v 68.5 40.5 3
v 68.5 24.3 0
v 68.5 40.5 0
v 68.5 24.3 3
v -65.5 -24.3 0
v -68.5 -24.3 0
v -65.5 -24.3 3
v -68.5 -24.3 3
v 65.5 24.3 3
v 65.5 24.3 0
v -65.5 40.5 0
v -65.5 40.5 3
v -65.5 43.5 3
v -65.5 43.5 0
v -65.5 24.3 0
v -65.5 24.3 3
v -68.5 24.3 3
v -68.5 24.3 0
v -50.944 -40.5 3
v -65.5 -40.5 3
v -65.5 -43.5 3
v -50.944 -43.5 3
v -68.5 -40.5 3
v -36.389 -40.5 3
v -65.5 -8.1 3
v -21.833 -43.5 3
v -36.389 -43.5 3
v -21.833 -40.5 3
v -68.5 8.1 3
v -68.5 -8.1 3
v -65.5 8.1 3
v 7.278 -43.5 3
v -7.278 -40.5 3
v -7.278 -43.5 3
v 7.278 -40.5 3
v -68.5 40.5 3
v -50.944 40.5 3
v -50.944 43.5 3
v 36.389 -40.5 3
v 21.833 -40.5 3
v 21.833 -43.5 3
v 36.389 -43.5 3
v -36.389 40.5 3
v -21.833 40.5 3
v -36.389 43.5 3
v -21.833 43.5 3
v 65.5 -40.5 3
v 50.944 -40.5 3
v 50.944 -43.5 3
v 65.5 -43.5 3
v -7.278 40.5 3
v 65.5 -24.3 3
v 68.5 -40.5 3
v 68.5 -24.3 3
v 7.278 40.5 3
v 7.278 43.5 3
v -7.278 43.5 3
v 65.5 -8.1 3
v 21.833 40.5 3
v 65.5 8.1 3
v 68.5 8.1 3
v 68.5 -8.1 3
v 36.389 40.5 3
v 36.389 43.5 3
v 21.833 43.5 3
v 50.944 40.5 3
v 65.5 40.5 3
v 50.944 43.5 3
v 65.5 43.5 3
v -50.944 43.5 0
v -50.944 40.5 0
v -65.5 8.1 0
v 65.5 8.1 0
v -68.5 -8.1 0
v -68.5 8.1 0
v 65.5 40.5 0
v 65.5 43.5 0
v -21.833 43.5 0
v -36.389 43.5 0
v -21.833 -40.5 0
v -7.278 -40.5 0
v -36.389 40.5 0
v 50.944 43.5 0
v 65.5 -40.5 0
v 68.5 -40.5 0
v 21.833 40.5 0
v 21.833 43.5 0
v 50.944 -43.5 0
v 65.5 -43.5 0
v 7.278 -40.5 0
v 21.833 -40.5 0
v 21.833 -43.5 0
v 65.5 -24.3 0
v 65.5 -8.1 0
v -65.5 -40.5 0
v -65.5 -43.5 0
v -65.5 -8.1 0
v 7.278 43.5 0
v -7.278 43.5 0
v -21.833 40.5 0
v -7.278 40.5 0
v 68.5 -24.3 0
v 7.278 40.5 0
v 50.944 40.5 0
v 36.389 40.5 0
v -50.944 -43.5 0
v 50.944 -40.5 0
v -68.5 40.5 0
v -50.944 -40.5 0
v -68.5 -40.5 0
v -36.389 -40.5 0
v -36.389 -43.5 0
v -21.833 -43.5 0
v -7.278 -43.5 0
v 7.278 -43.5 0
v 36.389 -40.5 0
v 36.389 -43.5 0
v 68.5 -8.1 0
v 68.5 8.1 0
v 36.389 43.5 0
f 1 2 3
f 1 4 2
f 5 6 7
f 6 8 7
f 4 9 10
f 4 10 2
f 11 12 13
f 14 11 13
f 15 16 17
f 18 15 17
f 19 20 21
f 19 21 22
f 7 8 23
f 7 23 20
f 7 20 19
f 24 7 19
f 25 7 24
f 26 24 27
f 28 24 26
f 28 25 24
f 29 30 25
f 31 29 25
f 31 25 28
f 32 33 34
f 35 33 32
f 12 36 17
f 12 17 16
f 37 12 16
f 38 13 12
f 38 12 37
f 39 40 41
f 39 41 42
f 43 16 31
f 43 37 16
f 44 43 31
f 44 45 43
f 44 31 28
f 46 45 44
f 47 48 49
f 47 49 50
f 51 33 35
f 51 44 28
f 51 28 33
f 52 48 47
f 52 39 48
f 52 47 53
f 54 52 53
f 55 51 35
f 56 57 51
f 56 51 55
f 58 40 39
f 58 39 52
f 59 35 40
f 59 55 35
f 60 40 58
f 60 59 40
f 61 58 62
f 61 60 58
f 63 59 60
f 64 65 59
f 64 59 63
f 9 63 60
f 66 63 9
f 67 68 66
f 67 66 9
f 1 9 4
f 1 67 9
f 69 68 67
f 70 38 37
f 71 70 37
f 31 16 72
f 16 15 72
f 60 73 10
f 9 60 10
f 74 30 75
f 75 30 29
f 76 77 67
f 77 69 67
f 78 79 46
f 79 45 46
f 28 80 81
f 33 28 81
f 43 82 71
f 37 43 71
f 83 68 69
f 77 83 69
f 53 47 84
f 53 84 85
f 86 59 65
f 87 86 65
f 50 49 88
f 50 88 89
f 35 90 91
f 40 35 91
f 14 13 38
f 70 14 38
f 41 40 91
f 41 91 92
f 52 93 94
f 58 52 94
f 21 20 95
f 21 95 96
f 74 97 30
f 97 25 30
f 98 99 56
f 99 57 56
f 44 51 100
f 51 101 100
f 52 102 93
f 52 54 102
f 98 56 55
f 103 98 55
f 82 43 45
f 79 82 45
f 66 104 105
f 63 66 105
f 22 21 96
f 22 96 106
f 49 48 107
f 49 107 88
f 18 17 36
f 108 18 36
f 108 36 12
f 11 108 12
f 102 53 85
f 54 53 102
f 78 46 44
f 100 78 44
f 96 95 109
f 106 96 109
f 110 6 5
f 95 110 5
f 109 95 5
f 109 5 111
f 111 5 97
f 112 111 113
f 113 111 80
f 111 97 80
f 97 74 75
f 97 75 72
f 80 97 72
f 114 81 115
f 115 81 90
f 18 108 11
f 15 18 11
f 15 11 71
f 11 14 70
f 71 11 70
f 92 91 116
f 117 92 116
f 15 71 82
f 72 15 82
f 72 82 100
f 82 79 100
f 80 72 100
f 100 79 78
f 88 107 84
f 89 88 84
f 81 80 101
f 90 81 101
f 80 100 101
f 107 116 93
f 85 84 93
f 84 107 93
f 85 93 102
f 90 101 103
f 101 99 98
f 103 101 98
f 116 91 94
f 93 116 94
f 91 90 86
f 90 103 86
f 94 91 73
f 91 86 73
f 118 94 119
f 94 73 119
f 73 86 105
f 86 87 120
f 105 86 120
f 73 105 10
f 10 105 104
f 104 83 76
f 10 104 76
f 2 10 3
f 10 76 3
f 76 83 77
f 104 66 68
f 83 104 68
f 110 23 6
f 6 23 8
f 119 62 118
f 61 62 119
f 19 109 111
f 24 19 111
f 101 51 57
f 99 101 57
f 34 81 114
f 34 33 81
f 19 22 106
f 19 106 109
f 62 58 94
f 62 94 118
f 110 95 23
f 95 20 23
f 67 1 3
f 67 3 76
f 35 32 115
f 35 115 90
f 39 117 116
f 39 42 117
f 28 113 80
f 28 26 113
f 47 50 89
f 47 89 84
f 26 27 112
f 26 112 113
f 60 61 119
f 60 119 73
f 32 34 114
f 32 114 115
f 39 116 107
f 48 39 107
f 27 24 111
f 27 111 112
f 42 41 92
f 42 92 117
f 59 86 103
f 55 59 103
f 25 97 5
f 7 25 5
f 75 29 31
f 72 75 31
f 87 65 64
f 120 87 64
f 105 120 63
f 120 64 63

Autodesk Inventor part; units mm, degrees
ref_plane "YZ Plane" through (0, 0, 0) normal (1, 0, 0) x (0, 1, 0)
ref_plane "XZ Plane" through (0, 0, 0) normal (0, 1, 0) x (-1, 0, 0)
ref_plane "XY Plane" through (0, 0, 0) normal (0, 0, 1) x (1, 0, 0)
sketch "Sketch1" plane through (0, 0, 0) normal (0, 0, 1) x (1, 0, 0)
  line L0 (-65.5, -40.5) -> (65.5, -40.5)
  line L1 (65.5, -40.5) -> (65.5, 40.5)
  line L2 (65.5, 40.5) -> (-65.5, 40.5)
  line L3 (-65.5, 40.5) -> (-65.5, -40.5)
  line L4 (-65.5, -40.5) -> (65.5, 40.5) construction
  line L5 (65.5, -40.5) -> (-65.5, 40.5) construction
  point P0 (0, 0)
  dimension "d0" = 131
  dimension "d1" = 81
extrude "Extrusion1" add sketch "Sketch1" along normal blind 3
sketch "Sketch2" plane through (0, 0, 3) normal (0, 0, 1) x (1, 0, 0)
  line L0 (65.5, -40.5) -> (65.5, 40.5) projected
  line L1 (65.5, 40.5) -> (65.5, 24.3)
  line L2 (65.5, 24.3) -> (68.5, 24.3)
  line L3 (68.5, 24.3) -> (68.5, 40.5)
  line L4 (68.5, 40.5) -> (65.5, 40.5)
  line L5 (65.5, 8.1) -> (65.5, -8.1)
  line L6 (65.5, -8.1) -> (68.5, -8.1)
  line L7 (68.5, -8.1) -> (68.5, 8.1)
  line L8 (68.5, 8.1) -> (65.5, 8.1)
  line L9 (65.5, -24.3) -> (65.5, -40.5)
  line L10 (65.5, -40.5) -> (68.5, -40.5)
  line L11 (68.5, -40.5) -> (68.5, -24.3)
  line L12 (68.5, -24.3) -> (65.5, -24.3)
  line L13 (0, -60.9) -> (0, 60.9) projected
  line L14 (-91.7, 0) -> (91.7, 0) projected
  line L15 (-65.5, -40.5) -> (-65.5, 40.5)
  line L16 (-65.5, 40.5) -> (-65.5, 24.3)
  line L17 (-65.5, 24.3) -> (-68.5, 24.3)
  line L18 (-68.5, 24.3) -> (-68.5, 40.5)
  line L19 (-68.5, 40.5) -> (-65.5, 40.5)
  line L20 (-65.5, 8.1) -> (-65.5, -8.1)
  line L21 (-65.5, -8.1) -> (-68.5, -8.1)
  line L22 (-68.5, -8.1) -> (-68.5, 8.1)
  line L23 (-68.5, 8.1) -> (-65.5, 8.1)
  line L24 (-65.5, -24.3) -> (-65.5, -40.5)
  line L25 (-65.5, -40.5) -> (-68.5, -40.5)
  line L26 (-68.5, -40.5) -> (-68.5, -24.3)
  line L27 (-68.5, -24.3) -> (-65.5, -24.3)
  line L28 (65.5, 40.5) -> (-65.5, 40.5) projected
  line L29 (65.5, 40.5) -> (50.9444, 40.5)
  line L30 (50.9444, 40.5) -> (50.9444, 43.5)
  line L31 (50.9444, 43.5) -> (65.5, 43.5)
  line L32 (65.5, 43.5) -> (65.5, 40.5)
  line L33 (36.3889, 40.5) -> (21.8333, 40.5)
  line L34 (21.8333, 40.5) -> (21.8333, 43.5)
  line L35 (21.8333, 43.5) -> (36.3889, 43.5)
  line L36 (36.3889, 43.5) -> (36.3889, 40.5)
  line L37 (7.2778, 40.5) -> (-7.2778, 40.5)
  line L38 (-7.2778, 40.5) -> (-7.2778, 43.5)
  line L39 (-7.2778, 43.5) -> (7.2778, 43.5)
  line L40 (7.2778, 43.5) -> (7.2778, 40.5)
  line L41 (-21.8333, 40.5) -> (-36.3889, 40.5)
  line L42 (-36.3889, 40.5) -> (-36.3889, 43.5)
  line L43 (-36.3889, 43.5) -> (-21.8333, 43.5)
  line L44 (-21.8333, 43.5) -> (-21.8333, 40.5)
  line L45 (-50.9444, 40.5) -> (-65.5, 40.5)
  line L46 (-65.5, 40.5) -> (-65.5, 43.5)
  line L47 (-65.5, 43.5) -> (-50.9444, 43.5)
  line L48 (-50.9444, 43.5) -> (-50.9444, 40.5)
  line L49 (-68.5, -40.5) -> (-65.5, -40.5)
  line L50 (65.5, -40.5) -> (-65.5, -40.5)
  line L51 (65.5, -40.5) -> (50.9444, -40.5)
  line L52 (50.9444, -40.5) -> (50.9444, -43.5)
  line L53 (50.9444, -43.5) -> (65.5, -43.5)
  line L54 (65.5, -43.5) -> (65.5, -40.5)
  line L55 (36.3889, -40.5) -> (21.8333, -40.5)
  line L56 (36.3889, -43.5) -> (36.3889, -40.5)
  line L57 (21.8333, -43.5) -> (36.3889, -43.5)
  line L58 (21.8333, -40.5) -> (21.8333, -43.5)
  line L59 (7.2778, -40.5) -> (-7.2778, -40.5)
  line L60 (7.2778, -43.5) -> (7.2778, -40.5)
  line L61 (-7.2778, -43.5) -> (7.2778, -43.5)
  line L62 (-7.2778, -40.5) -> (-7.2778, -43.5)
  line L63 (-21.8333, -40.5) -> (-36.3889, -40.5)
  line L64 (-21.8333, -43.5) -> (-21.8333, -40.5)
  line L65 (-36.3889, -43.5) -> (-21.8333, -43.5)
  line L66 (-36.3889, -40.5) -> (-36.3889, -43.5)
  line L67 (-50.9444, -40.5) -> (-65.5, -40.5)
  line L68 (-50.9444, -43.5) -> (-50.9444, -40.5)
  line L69 (-65.5, -43.5) -> (-50.9444, -43.5)
  line L70 (-65.5, -40.5) -> (-65.5, -43.5)
  point P0 (0, 0)
  point P1 (65.5, 0)
  point P2 (65.5, -32.4)
  point P3 (65.5, 0)
  point P4 (-65.5, 0)
  point P5 (-65.5, -32.4)
  point P6 (-65.5, 0)
  point P7 (0, 43.5)
  point P8 (0, 40.5)
  point P9 (0, -43.5)
  point P10 (0, -40.5)
  point P11 (-21.8333, -40.5)
  point P12 (7.2778, -40.5)
  point P13 (-7.2778, -40.5)
  point P14 (-7.2778, 40.5)
  point P15 (7.2778, 40.5)
  point P16 (-65.5, 8.1)
  point P17 (-21.8333, 40.5)
  dimension "d4" = 3
  dimension "d5" = 16.2
  dimension "d6" = 3
  dimension "d7" = 16.2
  dimension "d10" = 3
  dimension "d11" = 16.2
  dimension "d14" = 3
  dimension "d15" = 14.5556
  dimension "d16" = 3
  dimension "d17" = 14.5556
  dimension "d21" = 3
  dimension "d22" = 14.5556
  dimension "d26" = 3
  dimension "d27" = 14.5556
  dimension "d31" = 3
  dimension "d32" = 14.5556
  dimension "d36" = 14.5556
  dimension "d37" = 14.5556
extrude "Extrusion2" add sketch "Sketch2" against normal up to surface (3 mm away) contours L0 L12 L11 L10 | L54 L53 L52 L50 | L0 L14 L7 L6 | L56 L57 L58 L50 | L0 L8 L7 L14 | L60 L61 L13 L50 | L0 L4 L3 L2 | L13 L61 L62 L50 | L28 L38 L39 L13 | L13 L39 L40 L28 | L15 L21 L22 L14 | L14 L22 L23 L15 | L28 L30 L31 L32 | L64 L65 L66 L50 | L34 L35 L36 L28 | L28 L42 L43 L44 | L15 L25 L26 L27 | L17 L18 L19 L15 | L50 L68 L69 L70 | L46 L47 L48 L28
equation "\"d4\" = d2"
equation "\"d5\" = 0.2 * d1"
equation "\"d6\" = d8"
equation "\"d7\" = 0.2 * d9"
equation "\"d10\" = d12"
equation "\"d11\" = 0.2 * d13"
equation "\"d14\" = d4"
equation "\"d15\" = 0.111111 * d0"
equation "\"d16\" = d18"
equation "\"d17\" = d15"
equation "\"d21\" = d23"
equation "\"d22\" = d15"
equation "\"d26\" = d28"
equation "\"d27\" = d15"
equation "\"d31\" = d33"
equation "\"d32\" = d15"
equation "\"d36\" = d15"
equation "\"d37\" = d15"
equation "\"d8\" = d2"
equation "\"d9\" = d1"
equation "\"d12\" = d2"
equation "\"d13\" = d1"
equation "\"d18\" = d20"
equation "\"d20\" = d2"
equation "\"d23\" = d25"
equation "\"d25\" = d2"
equation "\"d28\" = d30"
equation "\"d30\" = d2"
equation "\"d33\" = d35"
equation "\"d35\" = d2"
equation "\"d2\" = 3"
properties part number "bottom"
